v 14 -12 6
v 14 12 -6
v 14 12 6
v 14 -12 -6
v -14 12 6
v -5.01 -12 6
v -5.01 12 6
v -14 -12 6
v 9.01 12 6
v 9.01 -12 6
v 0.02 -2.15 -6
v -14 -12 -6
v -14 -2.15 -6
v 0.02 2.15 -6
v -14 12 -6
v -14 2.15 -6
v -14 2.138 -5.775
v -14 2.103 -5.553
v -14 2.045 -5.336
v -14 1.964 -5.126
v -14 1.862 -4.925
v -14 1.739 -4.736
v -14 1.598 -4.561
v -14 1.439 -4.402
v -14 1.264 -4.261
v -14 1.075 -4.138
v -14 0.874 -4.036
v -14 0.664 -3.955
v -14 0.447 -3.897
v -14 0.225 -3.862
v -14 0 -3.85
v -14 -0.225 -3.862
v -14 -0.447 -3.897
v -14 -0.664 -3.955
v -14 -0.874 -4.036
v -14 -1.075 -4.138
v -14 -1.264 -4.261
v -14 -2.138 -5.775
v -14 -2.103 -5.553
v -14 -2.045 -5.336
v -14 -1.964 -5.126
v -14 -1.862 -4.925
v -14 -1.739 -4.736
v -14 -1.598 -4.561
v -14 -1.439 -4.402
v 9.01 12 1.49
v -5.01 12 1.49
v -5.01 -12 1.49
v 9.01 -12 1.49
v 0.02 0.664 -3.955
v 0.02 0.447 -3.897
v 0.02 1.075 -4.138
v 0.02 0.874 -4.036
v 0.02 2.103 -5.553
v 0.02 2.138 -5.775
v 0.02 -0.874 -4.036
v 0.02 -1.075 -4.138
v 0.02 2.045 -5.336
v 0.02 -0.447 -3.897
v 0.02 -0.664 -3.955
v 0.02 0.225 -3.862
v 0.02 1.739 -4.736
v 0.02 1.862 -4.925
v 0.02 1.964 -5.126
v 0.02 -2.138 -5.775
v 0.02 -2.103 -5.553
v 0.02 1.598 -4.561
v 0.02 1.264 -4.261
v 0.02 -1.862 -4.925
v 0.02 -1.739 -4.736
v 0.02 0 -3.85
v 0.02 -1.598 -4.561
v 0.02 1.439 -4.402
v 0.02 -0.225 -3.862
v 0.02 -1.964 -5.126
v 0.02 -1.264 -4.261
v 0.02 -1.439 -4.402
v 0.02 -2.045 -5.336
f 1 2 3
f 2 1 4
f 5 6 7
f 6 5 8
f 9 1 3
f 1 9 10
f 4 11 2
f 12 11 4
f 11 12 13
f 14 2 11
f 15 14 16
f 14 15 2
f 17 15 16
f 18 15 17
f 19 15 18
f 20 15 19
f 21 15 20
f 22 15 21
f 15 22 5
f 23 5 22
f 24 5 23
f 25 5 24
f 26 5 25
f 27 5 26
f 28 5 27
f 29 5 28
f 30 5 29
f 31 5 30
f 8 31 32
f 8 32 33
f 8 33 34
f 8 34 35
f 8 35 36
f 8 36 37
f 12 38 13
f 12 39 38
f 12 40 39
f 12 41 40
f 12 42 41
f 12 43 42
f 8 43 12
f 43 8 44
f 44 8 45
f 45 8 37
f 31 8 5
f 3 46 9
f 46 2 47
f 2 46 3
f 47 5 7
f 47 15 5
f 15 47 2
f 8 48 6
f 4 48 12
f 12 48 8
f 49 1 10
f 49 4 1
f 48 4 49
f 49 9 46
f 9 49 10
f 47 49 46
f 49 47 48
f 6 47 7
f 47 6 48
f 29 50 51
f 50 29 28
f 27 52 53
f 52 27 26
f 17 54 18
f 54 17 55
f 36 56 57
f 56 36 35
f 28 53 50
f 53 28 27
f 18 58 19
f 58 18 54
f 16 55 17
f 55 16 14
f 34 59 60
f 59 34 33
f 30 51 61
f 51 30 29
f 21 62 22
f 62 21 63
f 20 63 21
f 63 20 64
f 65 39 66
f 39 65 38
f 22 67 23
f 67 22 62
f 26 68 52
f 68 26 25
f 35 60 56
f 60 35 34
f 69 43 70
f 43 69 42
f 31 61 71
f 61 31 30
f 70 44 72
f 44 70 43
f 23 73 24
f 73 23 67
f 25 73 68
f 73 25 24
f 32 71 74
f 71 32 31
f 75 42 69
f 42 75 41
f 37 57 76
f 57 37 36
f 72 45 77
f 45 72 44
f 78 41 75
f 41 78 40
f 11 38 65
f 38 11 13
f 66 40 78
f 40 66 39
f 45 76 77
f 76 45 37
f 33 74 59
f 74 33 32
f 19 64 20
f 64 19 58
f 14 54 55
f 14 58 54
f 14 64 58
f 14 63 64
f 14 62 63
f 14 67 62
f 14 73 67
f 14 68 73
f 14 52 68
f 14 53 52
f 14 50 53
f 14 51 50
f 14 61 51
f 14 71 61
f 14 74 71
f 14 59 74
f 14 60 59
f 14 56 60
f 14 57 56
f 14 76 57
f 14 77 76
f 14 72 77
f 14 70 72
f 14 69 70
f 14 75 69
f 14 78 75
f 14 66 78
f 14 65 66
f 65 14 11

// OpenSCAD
// Snap panel clip with a U-shaped panel slot.
$fn = 60;
eps = 0.02;
panel_t = 4;
clip_w = 24;
clip_l = 28;
clip_h = panel_t + 8;
slot = panel_t + 0.5;
difference() {
    cube([clip_l,clip_w,clip_h],center=true);
    translate([2,0,clip_h/2-slot/2]) cube([clip_l/2+eps,clip_w+2*eps,slot+eps],center=true);
    translate([-clip_l/2-eps,0,-clip_h/2]) rotate([0,90,0]) cylinder(d=4.3,h=clip_l/2+2*eps);
}
